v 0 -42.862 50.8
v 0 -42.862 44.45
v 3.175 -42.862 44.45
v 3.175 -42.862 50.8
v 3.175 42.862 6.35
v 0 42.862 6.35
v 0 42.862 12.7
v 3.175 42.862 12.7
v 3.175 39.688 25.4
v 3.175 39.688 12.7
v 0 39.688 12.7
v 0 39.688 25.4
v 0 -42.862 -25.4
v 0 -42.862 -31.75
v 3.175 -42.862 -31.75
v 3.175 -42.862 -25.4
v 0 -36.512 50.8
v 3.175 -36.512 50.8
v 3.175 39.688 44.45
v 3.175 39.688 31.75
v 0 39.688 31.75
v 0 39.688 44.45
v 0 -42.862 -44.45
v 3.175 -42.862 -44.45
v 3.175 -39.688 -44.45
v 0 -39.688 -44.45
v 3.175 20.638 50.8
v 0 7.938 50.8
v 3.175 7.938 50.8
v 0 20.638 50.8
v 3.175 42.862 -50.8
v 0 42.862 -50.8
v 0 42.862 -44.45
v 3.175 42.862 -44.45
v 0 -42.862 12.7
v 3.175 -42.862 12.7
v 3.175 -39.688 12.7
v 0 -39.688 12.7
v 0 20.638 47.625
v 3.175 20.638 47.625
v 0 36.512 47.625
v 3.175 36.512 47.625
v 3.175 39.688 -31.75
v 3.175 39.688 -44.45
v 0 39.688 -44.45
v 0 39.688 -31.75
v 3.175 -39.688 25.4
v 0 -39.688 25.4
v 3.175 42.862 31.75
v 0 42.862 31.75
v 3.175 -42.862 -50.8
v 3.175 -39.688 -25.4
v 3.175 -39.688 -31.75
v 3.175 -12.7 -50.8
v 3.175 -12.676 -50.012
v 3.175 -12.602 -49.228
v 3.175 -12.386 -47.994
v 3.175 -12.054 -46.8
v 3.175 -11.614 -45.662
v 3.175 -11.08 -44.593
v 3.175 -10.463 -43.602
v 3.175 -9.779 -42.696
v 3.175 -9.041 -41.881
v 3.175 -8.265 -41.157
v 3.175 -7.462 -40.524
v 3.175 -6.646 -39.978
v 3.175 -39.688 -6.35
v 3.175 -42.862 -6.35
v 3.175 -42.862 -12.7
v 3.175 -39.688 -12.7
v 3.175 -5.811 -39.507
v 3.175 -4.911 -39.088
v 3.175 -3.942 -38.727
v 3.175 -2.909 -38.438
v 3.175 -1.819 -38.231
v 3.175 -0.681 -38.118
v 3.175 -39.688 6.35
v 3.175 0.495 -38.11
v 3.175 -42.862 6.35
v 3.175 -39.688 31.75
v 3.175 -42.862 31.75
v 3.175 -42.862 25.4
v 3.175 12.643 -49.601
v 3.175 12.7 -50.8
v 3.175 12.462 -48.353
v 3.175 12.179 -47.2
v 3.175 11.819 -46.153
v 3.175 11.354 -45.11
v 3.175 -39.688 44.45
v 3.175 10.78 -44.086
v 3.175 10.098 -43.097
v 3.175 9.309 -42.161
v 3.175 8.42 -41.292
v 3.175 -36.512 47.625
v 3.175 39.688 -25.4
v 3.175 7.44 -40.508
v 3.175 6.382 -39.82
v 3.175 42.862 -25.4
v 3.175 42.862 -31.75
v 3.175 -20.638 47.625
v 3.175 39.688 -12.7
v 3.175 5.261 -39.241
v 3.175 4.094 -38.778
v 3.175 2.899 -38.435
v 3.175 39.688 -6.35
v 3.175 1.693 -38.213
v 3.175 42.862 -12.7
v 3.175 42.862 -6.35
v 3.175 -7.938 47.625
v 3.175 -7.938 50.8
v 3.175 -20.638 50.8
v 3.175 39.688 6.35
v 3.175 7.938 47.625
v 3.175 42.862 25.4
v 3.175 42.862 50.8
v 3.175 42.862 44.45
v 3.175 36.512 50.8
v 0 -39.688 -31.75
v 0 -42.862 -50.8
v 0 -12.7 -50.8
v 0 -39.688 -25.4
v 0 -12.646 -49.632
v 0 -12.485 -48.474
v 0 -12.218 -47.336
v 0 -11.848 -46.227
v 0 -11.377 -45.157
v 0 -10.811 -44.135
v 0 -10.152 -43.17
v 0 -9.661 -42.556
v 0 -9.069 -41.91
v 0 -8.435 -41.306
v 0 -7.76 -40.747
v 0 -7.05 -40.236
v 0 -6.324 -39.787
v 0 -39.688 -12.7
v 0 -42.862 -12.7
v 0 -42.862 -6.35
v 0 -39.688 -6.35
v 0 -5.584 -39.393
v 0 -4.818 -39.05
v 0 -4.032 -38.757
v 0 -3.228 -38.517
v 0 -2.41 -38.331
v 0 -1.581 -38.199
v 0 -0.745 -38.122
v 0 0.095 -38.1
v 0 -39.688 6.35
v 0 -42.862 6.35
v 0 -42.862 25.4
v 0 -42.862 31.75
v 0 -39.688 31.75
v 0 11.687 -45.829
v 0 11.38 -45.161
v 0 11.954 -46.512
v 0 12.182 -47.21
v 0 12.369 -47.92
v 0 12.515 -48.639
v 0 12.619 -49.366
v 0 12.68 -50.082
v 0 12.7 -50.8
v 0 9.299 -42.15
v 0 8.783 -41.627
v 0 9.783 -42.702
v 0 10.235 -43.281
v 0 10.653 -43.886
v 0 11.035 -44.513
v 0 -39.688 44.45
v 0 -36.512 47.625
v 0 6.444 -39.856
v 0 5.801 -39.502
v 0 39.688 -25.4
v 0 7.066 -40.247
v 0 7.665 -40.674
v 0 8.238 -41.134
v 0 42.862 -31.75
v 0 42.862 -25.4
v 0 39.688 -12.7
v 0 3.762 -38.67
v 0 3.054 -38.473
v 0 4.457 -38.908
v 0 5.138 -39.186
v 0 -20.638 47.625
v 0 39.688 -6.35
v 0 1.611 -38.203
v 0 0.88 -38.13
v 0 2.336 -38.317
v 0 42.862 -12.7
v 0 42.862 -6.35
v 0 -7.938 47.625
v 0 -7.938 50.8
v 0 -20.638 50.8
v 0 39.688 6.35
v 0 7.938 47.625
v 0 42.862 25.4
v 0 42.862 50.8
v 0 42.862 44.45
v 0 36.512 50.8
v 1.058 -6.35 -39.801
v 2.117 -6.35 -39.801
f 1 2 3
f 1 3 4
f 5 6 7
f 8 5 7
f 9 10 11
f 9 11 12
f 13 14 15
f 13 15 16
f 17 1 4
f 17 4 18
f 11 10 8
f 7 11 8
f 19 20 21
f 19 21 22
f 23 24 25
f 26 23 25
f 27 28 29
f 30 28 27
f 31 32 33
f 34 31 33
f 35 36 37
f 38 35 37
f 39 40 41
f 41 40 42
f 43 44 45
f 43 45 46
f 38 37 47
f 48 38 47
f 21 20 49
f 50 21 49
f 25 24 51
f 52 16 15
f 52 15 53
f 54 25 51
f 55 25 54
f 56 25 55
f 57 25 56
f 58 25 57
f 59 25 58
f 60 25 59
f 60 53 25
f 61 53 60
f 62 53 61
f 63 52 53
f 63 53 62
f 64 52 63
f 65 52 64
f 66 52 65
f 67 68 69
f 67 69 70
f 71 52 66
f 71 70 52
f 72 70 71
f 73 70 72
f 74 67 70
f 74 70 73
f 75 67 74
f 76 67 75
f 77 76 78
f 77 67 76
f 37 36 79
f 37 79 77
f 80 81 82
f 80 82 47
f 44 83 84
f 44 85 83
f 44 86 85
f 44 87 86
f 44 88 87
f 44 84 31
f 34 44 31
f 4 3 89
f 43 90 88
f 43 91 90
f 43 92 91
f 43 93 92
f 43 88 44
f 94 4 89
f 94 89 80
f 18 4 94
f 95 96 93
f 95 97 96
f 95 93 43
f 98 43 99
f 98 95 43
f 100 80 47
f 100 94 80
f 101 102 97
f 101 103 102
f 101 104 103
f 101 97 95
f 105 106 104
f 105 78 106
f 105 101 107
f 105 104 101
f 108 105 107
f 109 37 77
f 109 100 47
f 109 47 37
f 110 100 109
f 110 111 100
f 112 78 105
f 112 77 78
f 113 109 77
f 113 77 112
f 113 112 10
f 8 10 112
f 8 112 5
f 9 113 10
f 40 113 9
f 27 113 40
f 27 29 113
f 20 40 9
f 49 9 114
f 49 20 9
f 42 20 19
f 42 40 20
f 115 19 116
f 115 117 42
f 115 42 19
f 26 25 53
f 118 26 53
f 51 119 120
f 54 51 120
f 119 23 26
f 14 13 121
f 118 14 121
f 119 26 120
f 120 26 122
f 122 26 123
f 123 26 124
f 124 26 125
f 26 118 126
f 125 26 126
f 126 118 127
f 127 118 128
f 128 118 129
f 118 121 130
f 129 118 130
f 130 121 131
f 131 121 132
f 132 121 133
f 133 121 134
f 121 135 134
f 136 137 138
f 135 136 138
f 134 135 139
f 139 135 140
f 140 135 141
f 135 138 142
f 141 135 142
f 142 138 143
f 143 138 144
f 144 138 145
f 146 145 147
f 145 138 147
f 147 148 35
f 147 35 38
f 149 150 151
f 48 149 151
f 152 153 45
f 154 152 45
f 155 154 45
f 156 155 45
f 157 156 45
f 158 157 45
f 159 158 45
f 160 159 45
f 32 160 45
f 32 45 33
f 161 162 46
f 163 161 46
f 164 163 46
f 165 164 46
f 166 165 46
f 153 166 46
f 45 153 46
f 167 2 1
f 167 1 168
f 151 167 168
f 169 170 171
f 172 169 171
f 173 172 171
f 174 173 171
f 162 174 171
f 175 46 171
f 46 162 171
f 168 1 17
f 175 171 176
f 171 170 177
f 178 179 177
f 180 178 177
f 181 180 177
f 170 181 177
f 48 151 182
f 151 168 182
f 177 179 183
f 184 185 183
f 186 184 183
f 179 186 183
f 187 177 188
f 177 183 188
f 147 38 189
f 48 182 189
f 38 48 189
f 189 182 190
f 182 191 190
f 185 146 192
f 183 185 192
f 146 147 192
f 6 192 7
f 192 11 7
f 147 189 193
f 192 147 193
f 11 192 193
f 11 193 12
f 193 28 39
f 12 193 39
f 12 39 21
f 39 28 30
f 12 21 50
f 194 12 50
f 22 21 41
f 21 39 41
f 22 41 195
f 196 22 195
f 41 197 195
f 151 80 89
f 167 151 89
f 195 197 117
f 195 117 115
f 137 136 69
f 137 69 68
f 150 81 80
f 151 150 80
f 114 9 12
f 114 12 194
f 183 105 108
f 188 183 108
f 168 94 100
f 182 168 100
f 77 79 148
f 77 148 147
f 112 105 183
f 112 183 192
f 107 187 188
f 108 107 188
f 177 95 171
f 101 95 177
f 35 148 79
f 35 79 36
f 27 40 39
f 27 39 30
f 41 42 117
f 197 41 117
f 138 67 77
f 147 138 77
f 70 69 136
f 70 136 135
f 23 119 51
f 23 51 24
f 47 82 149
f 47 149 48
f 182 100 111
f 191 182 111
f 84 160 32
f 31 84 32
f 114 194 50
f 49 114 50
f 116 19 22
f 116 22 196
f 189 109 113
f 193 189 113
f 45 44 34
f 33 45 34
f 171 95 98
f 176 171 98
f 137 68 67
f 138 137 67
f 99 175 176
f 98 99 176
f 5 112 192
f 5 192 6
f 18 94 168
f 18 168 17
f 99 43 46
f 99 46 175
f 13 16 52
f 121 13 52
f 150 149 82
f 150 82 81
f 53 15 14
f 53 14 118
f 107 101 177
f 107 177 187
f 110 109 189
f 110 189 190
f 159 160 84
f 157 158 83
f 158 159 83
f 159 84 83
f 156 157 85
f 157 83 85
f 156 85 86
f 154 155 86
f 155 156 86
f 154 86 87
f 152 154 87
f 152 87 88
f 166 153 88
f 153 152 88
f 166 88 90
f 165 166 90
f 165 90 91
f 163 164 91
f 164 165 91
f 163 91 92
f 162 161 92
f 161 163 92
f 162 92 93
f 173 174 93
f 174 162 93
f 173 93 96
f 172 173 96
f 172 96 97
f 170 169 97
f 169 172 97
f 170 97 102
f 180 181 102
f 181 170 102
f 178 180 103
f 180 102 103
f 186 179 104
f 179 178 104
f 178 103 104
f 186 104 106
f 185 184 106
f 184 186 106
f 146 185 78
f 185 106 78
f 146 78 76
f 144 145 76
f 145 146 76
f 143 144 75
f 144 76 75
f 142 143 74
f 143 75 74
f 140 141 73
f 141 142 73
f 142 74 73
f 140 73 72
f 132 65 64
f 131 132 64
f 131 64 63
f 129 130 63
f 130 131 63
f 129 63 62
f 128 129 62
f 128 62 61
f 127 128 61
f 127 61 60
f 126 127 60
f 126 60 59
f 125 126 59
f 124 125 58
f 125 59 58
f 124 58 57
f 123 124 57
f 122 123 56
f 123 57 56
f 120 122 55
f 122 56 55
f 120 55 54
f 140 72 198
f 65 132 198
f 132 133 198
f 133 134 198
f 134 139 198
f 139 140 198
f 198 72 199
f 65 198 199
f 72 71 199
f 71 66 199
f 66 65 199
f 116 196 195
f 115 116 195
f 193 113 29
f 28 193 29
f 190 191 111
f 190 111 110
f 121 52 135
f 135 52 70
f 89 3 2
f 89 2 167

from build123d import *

# Parameters (mm, degrees)
F0_W     = 85.725
F0_H     = 101.6
F1_DEPTH = 3.175
F2_W     = 3.175
F2_H     = 12.7
F3_DEPTH = 3.176
F4_W     = 15.875
F4_H     = 3.175
F5_DEPTH = 3.176
F7_DEPTH = 3.176


with BuildPart() as f1:
    # F0 (on Right) → F1 (new body)
    with BuildSketch(Plane.YZ):
        Rectangle(F0_W, F0_H)
    extrude(amount=F1_DEPTH)

    # F2 (on face) → F3 (cut, through all)
    with BuildSketch(Plane.YZ.offset(3.175)):
        with Locations((-41.275, -38.1)):
            Rectangle(F2_W, F2_H)
        with Locations((-41.275, -19.05)):
            Rectangle(F2_W, F2_H)
        with Locations((-41.275, 0)):
            Rectangle(F2_W, F2_H)
        with Locations((-41.275, 19.05)):
            Rectangle(F2_W, F2_H)
        with Locations((-41.275, 38.1)):
            Rectangle(F2_W, F2_H)
        with Locations((41.275, -38.1)):
            Rectangle(F2_W, F2_H)
        with Locations((41.275, -19.05)):
            Rectangle(F2_W, F2_H)
        with Locations((41.275, 38.1)):
            Rectangle(F2_W, F2_H)
        with Locations((41.275, 19.05)):
            Rectangle(F2_W, F2_H)
        with Locations((41.275, 0)):
            Rectangle(F2_W, F2_H)
    extrude(amount=-F3_DEPTH, mode=Mode.SUBTRACT)

    # F4 (on face) → F5 (cut, through all)
    with BuildSketch(Plane.YZ.offset(3.175)):
        with Locations((-28.575, 49.2125)):
            Rectangle(F4_W, F4_H)
        with Locations((0, 49.2125)):
            Rectangle(F4_W, F4_H)
        with Locations((28.575, 49.2125)):
            Rectangle(F4_W, F4_H)
    extrude(amount=-F5_DEPTH, mode=Mode.SUBTRACT)

    # F6 (on face) → F7 (cut, through all)
    with BuildSketch(Plane.YZ.offset(3.175)):
        with BuildLine():
            add(Edge.make_bspline(
                [(12.7, -50.8), (12.7, -28.802955), (-6.35, -39.801477), (-25.4, -50.8), (-6.35, -61.798523), (12.7, -72.797045), (12.7, -50.8)],
                knots=[0, 0, 0, 2.094395, 2.094395, 4.18879, 4.18879, 6.283185, 6.283185, 6.283185], degree=2, weights=[1, 0.5, 1, 0.5, 1, 0.5, 1]))
        make_face()
    extrude(amount=-F7_DEPTH, mode=Mode.SUBTRACT)


solid = f1.part
